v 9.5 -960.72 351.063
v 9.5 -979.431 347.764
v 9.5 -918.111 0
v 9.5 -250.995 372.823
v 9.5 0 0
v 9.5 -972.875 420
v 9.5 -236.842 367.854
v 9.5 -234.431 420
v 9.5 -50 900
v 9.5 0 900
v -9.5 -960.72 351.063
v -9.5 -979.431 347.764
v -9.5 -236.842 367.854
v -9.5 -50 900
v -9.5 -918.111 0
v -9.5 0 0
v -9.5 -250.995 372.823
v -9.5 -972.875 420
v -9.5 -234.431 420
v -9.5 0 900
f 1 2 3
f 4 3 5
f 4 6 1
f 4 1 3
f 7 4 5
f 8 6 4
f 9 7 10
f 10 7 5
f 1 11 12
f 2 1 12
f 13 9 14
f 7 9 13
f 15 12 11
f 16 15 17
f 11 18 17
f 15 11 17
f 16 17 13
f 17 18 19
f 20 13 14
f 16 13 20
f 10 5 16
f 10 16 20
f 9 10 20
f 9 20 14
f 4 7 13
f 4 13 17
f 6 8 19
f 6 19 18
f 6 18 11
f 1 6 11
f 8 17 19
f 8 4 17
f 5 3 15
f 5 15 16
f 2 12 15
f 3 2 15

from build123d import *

# Parameters (mm, degrees)
F1_DEPTH = 9.5
F3_DEPTH = 19.001


with BuildPart() as f1:
    # F0 (on Right) → F1 (new body, symmetric)
    with BuildSketch(Plane.YZ):
        Polygon((-979.431147, 420), (-979.431147, 0), (0, 0), (0, 900), (-50, 900), (-236.842401, 367.854187), (-250.995365, 372.823452), (-234.431147, 420), align=None)
    extrude(amount=F1_DEPTH, both=True)

    # F2 (on face) → F3 (cut, through all)
    with BuildSketch(Plane(origin=(-9.5, 0, 0), x_dir=(0, -1, 0), z_dir=(-1, 0, 0))):
        Polygon((979.431147, 0), (979.431147, 347.764142), (918.110946, 0), align=None)
        Polygon((960.719799, 351.063457), (979.431147, 347.764142), (979.431147, 420), (972.875172, 420), align=None)
    extrude(amount=-F3_DEPTH, mode=Mode.SUBTRACT)


solid = f1.part
